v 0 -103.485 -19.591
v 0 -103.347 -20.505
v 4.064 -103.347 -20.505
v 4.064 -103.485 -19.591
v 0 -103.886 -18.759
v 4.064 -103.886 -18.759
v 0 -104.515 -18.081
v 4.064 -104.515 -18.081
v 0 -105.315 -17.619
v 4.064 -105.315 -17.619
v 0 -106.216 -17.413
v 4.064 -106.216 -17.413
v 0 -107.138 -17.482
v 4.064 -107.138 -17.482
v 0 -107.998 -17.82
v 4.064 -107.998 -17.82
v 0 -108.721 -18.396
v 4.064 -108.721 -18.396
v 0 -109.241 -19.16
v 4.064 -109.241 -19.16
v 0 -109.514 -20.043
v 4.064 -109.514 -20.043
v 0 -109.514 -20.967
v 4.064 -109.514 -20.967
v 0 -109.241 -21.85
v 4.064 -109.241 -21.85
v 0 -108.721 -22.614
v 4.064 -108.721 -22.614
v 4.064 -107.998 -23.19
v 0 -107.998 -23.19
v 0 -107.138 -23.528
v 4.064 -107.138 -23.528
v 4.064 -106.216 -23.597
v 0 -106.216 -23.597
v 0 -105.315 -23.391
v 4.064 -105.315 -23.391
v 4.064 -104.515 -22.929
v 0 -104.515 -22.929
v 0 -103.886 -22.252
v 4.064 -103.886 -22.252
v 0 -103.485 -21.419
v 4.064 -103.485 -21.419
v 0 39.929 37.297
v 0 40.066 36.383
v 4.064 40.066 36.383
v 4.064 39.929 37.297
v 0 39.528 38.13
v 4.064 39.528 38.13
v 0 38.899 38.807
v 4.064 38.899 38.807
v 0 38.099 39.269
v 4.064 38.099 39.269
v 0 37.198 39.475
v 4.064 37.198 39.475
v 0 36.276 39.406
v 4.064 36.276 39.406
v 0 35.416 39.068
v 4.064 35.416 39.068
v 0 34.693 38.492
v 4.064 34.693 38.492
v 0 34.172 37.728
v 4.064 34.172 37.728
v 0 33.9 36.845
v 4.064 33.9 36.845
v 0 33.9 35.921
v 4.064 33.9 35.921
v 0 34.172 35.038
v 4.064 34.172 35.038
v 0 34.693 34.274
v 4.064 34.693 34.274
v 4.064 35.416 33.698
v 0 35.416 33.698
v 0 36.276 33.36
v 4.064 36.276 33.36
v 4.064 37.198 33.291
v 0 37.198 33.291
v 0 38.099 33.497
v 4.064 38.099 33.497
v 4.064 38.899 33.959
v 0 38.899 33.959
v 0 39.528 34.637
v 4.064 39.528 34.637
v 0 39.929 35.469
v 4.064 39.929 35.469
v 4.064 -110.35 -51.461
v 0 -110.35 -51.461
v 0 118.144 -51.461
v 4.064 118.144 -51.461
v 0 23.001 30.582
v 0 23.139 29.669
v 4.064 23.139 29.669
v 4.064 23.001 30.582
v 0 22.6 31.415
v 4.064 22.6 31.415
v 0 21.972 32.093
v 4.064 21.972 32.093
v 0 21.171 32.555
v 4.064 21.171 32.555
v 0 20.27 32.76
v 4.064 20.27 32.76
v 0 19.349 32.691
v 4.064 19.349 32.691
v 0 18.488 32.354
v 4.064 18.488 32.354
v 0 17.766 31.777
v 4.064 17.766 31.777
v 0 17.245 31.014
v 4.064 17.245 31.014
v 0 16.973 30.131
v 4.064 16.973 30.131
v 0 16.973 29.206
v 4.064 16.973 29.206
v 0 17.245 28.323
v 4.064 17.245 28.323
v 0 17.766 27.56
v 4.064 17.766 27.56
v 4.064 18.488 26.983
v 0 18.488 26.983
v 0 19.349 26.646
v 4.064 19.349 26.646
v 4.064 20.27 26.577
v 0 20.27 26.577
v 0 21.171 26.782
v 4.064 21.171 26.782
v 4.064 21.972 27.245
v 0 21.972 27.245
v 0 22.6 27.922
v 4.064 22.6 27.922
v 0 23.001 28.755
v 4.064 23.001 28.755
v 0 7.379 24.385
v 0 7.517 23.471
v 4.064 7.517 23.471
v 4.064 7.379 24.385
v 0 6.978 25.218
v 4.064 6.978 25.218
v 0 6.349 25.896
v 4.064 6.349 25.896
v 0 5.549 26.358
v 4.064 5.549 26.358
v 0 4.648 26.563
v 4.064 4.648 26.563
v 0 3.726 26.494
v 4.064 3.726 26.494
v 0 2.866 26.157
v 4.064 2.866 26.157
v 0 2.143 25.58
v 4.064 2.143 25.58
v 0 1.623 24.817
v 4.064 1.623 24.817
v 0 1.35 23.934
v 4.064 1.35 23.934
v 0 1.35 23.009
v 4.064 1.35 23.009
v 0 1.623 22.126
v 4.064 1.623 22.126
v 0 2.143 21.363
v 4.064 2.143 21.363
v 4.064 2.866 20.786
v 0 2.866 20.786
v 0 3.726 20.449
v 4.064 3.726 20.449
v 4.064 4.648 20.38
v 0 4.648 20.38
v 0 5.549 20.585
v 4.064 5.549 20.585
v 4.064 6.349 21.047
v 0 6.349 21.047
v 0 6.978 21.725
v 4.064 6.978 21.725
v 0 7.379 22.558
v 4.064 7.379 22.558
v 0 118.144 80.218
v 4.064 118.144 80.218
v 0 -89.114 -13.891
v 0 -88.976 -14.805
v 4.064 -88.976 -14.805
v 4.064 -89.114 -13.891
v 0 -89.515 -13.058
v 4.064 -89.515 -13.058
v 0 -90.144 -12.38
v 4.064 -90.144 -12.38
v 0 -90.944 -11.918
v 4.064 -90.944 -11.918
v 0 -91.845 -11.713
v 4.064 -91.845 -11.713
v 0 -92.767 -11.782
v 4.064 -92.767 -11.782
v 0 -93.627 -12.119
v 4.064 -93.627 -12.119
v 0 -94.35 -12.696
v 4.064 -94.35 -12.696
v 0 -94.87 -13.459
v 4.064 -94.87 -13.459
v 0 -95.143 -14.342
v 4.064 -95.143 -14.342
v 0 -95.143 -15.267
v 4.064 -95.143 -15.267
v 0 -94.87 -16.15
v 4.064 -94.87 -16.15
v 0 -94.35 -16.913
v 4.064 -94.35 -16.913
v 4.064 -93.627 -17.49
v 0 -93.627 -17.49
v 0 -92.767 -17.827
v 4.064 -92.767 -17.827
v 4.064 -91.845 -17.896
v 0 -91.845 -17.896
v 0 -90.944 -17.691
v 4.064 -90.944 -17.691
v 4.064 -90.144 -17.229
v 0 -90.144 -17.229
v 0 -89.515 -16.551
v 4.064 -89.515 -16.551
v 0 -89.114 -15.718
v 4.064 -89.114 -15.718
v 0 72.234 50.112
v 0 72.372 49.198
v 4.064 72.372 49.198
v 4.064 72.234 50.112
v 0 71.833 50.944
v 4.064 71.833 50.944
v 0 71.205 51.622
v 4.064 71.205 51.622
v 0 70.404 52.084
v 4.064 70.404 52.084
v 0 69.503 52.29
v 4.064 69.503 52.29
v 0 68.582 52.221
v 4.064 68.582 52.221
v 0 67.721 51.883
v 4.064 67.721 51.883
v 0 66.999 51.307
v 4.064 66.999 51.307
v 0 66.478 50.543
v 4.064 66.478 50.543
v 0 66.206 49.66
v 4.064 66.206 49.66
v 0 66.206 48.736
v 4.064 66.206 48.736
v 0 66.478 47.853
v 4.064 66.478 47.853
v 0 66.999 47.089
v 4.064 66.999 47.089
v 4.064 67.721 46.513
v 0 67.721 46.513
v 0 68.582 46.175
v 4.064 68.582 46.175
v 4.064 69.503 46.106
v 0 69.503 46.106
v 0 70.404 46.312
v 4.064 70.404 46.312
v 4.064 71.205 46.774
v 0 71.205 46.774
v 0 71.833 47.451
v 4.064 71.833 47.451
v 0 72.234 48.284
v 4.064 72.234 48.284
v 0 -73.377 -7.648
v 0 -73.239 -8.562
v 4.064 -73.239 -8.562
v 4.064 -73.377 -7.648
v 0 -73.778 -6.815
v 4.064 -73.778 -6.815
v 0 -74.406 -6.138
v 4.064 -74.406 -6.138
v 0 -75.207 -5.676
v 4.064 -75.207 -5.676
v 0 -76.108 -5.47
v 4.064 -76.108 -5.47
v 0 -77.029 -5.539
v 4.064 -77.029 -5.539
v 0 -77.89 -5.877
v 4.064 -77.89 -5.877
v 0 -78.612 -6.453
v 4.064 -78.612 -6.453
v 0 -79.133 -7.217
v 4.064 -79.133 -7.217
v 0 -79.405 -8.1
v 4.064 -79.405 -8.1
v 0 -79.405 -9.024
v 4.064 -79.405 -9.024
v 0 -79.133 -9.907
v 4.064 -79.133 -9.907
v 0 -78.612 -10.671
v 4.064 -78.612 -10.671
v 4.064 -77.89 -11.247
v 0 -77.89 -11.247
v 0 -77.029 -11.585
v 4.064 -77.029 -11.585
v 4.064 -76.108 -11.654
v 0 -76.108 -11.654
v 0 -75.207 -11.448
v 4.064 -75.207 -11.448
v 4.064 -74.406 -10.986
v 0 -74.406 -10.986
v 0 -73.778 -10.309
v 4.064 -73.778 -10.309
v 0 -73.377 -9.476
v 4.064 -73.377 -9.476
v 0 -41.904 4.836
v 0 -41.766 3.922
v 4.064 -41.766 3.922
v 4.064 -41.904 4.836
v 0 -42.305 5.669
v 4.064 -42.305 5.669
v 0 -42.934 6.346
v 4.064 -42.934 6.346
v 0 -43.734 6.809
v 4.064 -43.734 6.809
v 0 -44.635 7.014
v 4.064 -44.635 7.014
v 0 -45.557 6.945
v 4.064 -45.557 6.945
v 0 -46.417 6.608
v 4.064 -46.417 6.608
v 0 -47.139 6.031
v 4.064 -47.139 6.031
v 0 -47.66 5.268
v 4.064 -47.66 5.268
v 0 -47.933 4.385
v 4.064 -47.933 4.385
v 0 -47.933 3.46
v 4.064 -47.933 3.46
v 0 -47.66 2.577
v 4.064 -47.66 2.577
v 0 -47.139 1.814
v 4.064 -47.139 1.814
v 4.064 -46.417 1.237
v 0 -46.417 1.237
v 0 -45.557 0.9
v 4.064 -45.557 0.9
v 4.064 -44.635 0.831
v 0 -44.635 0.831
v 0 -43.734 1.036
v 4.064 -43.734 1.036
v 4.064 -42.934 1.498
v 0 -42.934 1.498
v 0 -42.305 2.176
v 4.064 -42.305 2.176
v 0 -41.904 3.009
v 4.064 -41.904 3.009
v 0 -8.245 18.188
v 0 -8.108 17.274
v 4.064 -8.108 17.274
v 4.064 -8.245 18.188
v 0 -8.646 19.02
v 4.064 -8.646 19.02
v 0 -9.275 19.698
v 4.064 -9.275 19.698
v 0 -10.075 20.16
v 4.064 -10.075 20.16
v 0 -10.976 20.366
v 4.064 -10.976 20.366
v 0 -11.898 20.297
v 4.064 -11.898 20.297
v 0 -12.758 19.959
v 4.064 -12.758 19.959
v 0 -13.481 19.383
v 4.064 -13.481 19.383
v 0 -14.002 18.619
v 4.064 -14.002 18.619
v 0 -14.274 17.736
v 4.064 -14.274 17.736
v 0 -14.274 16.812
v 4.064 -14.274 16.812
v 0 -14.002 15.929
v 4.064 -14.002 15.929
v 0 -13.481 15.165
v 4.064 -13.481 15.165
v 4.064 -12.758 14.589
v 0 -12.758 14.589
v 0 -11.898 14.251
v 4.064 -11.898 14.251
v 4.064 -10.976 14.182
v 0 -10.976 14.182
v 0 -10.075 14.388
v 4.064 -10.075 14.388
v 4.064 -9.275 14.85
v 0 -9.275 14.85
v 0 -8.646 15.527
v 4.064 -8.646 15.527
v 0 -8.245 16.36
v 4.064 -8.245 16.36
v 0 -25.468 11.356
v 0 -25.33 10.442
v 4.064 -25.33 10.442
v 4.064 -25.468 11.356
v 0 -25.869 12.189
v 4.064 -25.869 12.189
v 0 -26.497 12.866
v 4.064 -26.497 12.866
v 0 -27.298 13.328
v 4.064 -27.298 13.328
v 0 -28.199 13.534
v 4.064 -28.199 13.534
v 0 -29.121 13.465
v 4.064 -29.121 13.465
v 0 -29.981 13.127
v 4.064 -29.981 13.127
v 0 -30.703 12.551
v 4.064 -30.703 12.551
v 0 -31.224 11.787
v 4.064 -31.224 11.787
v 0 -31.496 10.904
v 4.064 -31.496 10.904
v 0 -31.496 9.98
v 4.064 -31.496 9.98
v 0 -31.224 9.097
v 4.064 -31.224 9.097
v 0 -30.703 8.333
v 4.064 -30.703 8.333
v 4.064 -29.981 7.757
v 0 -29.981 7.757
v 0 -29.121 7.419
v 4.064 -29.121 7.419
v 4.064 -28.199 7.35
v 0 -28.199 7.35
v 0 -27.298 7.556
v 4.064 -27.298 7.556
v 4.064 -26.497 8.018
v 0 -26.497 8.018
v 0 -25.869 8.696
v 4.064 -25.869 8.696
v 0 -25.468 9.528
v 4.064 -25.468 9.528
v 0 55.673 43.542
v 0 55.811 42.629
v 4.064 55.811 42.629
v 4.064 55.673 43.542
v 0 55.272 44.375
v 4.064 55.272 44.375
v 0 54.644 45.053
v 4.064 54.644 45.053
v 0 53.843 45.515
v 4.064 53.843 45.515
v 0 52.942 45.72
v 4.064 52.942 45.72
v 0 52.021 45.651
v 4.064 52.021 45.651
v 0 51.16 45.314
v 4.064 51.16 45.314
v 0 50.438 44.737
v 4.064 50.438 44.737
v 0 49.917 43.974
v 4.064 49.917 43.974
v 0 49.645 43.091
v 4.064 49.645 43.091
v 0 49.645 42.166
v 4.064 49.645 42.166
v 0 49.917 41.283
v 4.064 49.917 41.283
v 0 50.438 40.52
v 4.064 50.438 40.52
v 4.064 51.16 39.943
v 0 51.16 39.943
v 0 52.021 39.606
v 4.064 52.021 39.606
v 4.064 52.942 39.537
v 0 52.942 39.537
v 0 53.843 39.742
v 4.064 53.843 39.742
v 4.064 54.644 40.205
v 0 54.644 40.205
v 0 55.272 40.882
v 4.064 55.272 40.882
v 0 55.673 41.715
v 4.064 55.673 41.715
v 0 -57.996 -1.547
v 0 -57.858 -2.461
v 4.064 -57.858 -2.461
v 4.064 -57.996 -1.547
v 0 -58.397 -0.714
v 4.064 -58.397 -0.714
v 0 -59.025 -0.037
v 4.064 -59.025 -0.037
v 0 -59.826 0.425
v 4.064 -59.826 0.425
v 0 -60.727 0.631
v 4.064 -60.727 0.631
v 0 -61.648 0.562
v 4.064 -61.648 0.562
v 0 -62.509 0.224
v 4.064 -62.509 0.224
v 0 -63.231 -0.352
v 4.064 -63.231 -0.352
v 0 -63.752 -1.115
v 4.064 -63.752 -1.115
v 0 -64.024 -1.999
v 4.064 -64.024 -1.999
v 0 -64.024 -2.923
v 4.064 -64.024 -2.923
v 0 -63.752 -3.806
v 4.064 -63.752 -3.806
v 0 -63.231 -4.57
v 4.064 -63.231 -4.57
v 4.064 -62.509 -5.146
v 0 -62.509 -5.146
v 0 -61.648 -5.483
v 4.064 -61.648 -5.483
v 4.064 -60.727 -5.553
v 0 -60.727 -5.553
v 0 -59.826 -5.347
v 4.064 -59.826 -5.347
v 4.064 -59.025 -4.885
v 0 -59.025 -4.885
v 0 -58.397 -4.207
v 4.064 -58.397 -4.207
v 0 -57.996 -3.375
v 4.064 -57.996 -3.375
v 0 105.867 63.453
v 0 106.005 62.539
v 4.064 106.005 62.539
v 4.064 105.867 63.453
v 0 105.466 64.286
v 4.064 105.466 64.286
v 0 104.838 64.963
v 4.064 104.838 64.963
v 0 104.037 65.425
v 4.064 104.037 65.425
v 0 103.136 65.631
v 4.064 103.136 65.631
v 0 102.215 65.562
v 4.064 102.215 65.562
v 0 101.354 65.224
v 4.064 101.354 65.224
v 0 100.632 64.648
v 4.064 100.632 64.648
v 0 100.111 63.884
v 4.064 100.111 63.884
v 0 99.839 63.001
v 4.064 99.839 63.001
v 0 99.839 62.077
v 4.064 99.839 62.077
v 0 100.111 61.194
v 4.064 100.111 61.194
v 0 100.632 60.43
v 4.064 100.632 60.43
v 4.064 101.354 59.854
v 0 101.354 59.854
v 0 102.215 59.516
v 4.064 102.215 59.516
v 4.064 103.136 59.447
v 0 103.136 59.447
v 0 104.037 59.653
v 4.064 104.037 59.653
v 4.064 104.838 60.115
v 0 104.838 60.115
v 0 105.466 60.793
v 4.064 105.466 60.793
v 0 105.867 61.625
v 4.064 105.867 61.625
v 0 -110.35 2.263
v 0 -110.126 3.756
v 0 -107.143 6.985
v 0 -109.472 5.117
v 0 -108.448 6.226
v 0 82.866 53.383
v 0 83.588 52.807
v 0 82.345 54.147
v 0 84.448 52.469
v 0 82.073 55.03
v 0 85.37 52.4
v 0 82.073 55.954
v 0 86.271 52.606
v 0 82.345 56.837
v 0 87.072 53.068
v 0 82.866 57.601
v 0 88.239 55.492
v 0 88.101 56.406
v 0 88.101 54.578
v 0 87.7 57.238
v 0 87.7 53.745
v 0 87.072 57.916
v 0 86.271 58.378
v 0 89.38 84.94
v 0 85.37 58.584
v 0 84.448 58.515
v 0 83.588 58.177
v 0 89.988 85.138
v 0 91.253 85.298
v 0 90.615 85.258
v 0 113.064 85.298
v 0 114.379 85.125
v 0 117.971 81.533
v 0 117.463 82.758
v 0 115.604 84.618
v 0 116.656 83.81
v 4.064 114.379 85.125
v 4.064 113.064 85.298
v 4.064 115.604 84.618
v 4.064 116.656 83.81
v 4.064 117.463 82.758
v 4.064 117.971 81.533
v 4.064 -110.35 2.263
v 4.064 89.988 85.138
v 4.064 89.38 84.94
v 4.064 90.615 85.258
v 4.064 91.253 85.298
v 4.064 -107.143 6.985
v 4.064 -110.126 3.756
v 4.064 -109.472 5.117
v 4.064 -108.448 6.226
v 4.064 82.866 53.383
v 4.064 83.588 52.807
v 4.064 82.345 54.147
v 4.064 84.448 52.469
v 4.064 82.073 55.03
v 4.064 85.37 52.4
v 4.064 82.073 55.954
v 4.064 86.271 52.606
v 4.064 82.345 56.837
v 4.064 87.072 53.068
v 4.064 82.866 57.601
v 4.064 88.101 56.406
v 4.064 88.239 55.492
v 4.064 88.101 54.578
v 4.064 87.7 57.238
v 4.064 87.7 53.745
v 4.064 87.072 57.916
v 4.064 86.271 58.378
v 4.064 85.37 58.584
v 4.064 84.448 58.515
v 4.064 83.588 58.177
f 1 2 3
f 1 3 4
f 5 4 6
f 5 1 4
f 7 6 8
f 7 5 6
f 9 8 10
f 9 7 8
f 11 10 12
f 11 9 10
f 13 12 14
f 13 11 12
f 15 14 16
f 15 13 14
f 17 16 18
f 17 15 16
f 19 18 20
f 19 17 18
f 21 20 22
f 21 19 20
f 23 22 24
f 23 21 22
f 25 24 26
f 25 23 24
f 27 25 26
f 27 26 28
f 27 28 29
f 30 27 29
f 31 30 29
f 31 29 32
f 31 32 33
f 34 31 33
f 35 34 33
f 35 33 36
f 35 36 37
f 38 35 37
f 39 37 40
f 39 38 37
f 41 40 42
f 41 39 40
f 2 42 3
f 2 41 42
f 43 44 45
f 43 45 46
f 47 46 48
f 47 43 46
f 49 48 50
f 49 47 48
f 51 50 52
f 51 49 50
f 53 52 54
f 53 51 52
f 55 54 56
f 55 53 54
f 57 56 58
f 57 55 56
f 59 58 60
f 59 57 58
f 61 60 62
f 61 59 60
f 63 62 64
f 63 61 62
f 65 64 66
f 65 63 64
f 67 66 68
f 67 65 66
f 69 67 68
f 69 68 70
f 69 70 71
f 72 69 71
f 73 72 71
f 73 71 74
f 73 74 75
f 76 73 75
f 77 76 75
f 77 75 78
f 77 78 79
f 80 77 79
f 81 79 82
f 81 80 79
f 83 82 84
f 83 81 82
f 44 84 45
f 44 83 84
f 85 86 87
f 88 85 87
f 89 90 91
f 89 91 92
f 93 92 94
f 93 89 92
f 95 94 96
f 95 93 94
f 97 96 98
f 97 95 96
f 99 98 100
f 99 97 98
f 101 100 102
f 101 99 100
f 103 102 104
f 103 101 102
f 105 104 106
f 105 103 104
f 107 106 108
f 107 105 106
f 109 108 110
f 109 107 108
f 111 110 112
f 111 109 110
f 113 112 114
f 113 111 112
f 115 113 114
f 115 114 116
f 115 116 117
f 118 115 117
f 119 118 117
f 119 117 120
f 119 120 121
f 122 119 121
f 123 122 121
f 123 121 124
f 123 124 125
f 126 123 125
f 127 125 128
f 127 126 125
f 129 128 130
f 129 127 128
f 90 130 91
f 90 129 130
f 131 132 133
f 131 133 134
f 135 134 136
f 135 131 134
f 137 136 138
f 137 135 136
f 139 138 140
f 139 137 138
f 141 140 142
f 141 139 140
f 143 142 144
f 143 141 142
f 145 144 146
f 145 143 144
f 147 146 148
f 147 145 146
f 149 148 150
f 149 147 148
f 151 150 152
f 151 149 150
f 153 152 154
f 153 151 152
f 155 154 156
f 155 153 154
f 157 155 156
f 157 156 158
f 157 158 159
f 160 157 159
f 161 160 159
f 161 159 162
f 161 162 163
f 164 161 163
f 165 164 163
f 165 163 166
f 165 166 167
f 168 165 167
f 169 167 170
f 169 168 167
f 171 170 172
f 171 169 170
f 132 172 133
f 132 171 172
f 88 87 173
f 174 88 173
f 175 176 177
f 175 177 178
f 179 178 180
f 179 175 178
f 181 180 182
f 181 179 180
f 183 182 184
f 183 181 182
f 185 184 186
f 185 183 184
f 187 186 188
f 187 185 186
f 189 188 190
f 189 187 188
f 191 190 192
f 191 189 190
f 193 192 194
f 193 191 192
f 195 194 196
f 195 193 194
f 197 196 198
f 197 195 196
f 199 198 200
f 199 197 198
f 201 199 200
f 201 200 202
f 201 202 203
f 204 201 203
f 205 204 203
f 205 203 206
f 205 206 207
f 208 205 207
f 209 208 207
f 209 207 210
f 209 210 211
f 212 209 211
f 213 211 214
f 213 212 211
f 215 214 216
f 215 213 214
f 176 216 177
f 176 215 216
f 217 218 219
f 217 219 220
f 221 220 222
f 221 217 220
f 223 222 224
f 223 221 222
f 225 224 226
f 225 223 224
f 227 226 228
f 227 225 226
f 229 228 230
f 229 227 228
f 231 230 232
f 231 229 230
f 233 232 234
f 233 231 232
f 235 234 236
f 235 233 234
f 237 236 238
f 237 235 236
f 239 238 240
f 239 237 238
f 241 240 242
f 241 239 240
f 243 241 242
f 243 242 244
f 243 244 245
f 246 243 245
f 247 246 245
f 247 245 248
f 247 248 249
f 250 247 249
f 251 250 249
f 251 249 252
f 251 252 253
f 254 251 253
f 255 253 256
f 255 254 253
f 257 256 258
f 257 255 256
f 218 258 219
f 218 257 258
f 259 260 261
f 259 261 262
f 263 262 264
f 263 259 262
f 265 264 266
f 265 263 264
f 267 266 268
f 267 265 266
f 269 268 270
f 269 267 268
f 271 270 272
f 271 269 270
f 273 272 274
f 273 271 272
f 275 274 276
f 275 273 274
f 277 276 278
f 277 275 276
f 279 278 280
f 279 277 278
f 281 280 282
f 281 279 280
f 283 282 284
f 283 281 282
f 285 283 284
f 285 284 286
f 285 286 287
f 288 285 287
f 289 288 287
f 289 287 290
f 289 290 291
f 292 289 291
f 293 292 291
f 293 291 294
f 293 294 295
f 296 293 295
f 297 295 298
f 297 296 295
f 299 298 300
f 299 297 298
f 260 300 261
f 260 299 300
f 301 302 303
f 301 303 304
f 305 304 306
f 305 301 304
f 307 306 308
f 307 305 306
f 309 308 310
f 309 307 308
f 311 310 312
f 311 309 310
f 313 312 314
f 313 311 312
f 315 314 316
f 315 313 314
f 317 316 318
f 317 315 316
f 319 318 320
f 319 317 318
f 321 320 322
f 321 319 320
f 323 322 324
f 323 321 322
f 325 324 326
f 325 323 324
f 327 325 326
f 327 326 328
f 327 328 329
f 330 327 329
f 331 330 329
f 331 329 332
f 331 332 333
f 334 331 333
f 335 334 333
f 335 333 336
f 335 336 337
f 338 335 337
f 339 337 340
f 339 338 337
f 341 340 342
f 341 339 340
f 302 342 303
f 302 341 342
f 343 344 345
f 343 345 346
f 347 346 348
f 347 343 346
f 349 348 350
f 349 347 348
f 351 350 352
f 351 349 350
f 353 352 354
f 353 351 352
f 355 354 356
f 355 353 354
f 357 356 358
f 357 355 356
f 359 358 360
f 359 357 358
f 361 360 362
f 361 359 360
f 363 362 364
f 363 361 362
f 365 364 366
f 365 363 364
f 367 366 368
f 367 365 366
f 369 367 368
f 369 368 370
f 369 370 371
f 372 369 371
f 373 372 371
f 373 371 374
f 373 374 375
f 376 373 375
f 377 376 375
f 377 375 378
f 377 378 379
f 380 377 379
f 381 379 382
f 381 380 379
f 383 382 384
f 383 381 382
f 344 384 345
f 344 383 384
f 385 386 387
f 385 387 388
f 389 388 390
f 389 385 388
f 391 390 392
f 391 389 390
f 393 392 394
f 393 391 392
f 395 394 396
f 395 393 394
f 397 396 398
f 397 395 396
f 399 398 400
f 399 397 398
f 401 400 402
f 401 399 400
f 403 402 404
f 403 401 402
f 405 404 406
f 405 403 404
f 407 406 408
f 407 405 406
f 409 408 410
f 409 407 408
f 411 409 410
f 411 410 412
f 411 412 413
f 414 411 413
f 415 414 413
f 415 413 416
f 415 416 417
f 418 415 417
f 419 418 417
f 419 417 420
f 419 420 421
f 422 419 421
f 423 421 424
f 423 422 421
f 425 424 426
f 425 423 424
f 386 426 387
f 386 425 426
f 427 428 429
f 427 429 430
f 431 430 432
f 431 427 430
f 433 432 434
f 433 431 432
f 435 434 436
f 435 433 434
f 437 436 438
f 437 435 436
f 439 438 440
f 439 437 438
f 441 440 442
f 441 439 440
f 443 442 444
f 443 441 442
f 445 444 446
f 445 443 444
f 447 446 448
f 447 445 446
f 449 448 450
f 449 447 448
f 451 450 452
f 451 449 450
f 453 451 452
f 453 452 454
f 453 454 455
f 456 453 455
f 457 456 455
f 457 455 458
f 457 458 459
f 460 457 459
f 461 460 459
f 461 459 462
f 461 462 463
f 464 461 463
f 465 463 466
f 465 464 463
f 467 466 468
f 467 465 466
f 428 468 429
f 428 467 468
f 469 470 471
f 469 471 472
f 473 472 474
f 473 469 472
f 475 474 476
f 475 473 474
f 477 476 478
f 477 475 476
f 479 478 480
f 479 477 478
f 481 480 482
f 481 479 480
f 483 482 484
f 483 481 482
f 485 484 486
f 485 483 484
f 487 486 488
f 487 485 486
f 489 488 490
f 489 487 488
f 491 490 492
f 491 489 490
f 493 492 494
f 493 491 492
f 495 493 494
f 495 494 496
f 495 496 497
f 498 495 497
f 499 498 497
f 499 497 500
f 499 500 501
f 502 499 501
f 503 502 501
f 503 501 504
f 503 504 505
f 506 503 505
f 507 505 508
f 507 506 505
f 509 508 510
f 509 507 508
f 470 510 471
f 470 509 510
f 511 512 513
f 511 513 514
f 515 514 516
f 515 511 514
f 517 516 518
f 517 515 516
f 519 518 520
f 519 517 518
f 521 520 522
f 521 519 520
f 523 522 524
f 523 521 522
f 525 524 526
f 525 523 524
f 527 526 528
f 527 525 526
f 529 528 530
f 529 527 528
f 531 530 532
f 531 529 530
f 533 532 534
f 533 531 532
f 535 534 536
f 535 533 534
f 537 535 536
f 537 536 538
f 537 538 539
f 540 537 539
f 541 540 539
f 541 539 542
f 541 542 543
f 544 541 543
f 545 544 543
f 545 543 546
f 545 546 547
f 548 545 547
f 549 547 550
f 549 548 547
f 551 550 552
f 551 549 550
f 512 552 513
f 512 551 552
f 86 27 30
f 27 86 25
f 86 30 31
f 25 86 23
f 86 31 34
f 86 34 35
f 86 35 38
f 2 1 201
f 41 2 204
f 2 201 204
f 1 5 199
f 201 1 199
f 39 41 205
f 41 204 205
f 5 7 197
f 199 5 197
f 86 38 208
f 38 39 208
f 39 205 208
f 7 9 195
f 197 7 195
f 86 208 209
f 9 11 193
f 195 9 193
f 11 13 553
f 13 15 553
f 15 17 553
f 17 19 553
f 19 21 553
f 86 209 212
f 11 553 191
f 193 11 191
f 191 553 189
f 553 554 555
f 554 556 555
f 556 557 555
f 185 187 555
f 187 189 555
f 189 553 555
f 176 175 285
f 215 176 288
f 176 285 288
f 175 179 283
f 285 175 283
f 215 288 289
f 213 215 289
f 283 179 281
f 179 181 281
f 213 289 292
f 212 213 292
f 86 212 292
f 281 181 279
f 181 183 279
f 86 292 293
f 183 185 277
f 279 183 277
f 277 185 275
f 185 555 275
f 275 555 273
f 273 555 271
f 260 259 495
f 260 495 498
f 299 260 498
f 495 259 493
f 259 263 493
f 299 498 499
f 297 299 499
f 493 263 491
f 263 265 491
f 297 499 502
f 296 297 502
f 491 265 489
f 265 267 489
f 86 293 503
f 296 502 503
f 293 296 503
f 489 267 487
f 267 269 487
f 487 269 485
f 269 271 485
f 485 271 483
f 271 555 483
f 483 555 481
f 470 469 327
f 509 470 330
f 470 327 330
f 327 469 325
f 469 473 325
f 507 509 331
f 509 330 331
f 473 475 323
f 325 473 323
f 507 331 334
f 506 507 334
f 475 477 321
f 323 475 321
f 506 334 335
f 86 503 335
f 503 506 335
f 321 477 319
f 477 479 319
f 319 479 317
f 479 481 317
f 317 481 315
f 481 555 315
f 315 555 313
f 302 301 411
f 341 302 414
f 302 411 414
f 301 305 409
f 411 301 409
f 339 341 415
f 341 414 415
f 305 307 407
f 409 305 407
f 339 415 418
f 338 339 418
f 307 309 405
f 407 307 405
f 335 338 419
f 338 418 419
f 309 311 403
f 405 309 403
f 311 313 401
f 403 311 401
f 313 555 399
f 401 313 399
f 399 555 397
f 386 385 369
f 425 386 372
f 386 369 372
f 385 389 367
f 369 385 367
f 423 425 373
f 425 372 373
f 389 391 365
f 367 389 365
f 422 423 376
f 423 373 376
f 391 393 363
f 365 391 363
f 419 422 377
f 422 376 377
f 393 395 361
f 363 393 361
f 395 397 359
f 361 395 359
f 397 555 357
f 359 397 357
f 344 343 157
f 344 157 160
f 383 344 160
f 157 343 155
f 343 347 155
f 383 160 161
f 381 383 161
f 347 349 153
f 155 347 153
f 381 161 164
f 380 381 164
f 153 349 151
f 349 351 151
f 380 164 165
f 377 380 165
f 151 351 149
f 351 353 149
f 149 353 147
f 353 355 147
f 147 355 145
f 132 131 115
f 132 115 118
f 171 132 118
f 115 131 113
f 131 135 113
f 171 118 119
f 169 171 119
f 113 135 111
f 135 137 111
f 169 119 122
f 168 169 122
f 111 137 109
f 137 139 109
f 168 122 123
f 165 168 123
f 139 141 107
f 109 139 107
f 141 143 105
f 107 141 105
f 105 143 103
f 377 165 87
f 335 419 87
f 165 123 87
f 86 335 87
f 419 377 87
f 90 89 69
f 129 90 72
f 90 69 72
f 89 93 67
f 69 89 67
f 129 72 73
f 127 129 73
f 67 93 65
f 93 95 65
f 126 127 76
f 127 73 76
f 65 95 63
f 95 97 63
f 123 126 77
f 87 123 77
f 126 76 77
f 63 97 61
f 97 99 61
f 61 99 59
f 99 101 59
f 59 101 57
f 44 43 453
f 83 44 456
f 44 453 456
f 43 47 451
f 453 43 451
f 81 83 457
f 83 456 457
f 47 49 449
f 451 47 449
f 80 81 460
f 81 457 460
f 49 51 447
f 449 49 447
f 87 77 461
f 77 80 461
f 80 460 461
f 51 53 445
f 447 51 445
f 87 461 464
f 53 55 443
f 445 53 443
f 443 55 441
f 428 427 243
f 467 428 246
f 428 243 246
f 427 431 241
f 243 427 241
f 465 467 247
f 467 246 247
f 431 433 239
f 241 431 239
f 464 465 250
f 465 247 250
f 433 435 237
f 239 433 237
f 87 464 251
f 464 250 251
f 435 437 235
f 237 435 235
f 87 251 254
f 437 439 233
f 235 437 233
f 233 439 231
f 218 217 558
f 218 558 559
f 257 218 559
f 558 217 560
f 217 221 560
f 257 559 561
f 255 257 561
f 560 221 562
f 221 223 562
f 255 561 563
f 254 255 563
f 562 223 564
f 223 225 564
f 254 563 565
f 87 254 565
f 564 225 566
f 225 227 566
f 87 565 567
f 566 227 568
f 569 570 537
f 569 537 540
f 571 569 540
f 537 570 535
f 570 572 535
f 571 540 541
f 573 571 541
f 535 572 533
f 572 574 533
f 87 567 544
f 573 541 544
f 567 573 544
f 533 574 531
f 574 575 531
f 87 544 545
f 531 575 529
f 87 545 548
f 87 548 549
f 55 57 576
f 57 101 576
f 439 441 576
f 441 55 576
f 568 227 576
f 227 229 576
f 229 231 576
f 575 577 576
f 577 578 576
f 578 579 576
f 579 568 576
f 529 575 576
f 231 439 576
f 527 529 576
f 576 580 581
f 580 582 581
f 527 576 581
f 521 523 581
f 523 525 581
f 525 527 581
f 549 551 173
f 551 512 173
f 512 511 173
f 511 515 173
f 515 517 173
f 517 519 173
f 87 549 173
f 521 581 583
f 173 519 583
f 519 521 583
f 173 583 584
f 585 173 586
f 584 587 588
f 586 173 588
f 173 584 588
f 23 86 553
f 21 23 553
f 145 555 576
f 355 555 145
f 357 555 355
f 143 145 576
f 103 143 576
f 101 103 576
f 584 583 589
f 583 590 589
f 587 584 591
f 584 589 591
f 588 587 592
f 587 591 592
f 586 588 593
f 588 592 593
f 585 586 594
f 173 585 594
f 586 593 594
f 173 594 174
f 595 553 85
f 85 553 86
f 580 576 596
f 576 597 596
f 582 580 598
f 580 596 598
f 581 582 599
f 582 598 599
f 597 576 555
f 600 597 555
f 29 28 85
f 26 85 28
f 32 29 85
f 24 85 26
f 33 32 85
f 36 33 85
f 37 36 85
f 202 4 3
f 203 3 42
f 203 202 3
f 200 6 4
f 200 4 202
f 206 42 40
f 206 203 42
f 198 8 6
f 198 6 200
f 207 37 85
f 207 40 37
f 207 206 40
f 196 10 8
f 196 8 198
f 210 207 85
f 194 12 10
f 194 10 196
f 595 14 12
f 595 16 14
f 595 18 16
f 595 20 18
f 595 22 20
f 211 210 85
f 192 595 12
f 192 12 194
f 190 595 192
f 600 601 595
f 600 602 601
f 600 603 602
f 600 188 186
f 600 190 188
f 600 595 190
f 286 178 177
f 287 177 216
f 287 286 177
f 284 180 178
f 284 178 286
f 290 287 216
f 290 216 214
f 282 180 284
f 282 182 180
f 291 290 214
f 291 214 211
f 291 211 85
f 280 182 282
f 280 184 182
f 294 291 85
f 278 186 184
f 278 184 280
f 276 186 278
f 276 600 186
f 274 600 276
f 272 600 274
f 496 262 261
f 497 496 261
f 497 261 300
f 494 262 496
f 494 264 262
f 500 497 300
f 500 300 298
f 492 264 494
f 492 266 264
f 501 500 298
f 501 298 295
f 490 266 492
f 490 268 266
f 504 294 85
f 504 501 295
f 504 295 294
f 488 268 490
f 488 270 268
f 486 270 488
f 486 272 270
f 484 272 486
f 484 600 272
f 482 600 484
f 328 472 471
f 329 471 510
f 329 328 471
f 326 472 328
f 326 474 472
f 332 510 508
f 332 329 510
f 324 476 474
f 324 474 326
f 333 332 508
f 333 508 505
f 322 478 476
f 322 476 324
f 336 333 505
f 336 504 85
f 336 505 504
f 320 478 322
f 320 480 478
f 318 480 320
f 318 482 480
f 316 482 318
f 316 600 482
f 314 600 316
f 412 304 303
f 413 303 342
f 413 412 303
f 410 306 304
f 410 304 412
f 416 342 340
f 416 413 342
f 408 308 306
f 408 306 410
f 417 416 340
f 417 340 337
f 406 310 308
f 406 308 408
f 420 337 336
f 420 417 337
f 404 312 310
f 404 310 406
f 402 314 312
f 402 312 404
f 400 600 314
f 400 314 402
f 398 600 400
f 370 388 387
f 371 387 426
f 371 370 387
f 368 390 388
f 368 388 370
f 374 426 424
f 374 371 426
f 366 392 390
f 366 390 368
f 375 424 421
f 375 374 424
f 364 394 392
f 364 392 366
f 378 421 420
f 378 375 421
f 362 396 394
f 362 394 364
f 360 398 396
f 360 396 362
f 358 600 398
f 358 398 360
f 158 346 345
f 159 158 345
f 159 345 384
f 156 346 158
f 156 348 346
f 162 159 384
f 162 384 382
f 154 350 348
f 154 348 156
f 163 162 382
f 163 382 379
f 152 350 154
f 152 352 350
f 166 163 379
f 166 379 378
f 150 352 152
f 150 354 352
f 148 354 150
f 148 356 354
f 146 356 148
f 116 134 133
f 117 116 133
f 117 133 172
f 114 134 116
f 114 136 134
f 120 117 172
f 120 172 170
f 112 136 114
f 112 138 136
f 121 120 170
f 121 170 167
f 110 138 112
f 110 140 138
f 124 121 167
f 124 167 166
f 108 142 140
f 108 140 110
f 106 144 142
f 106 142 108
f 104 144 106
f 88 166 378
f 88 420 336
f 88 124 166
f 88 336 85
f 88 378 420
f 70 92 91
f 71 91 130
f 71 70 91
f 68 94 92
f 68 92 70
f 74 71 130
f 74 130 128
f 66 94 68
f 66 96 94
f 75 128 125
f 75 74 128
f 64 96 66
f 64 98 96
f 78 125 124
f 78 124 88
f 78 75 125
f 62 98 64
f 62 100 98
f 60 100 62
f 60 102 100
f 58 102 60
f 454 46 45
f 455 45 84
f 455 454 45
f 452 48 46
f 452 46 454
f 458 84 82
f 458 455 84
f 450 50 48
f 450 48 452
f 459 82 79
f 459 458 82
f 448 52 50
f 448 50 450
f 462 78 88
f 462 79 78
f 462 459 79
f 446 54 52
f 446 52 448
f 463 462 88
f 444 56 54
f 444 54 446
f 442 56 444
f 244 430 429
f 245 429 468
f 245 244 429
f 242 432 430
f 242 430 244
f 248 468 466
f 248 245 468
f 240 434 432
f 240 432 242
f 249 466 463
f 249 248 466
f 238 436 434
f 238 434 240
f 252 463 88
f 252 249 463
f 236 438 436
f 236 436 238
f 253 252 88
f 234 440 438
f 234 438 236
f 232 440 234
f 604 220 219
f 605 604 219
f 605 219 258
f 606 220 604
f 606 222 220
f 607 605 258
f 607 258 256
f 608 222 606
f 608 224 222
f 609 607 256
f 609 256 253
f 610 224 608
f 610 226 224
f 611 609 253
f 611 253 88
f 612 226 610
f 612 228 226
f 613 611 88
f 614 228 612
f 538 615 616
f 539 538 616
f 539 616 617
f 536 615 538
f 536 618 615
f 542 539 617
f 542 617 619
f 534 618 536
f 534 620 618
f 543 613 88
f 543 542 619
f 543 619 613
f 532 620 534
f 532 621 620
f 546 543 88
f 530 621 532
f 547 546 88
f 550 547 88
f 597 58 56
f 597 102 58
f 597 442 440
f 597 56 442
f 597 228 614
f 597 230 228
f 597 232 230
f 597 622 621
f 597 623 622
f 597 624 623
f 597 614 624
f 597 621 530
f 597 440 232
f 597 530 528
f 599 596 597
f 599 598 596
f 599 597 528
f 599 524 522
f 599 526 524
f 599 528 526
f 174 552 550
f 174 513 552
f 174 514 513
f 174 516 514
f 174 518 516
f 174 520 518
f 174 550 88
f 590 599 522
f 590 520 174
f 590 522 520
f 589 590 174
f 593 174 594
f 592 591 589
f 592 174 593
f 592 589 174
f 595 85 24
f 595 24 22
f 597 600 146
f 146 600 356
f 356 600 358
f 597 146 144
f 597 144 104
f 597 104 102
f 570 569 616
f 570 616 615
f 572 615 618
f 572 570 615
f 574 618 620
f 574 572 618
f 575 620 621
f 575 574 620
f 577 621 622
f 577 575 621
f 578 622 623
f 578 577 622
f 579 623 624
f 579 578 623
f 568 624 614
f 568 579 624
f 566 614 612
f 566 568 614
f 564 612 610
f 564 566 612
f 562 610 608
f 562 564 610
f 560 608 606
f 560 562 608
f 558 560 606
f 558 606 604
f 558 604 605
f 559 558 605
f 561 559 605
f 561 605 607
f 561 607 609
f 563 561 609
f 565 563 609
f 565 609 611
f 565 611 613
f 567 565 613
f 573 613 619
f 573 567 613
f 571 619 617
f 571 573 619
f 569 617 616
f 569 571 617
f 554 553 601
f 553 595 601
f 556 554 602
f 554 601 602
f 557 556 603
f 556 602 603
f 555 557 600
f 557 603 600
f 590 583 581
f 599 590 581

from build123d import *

# Parameters (mm, degrees)
F0_R     = 3.100498
F1_DEPTH = 4.064
F2_R     = 5.08


with BuildPart() as f1:
    # F0 (on Right) → F1 (new body)
    with BuildSketch(Plane.YZ):
        Polygon((-110.349961, 5.712933), (-110.349961, -51.461264), (118.143998, -51.461264), (118.143998, 85.298181), (90.28247, 85.298181), align=None)
        with Locations((-106.447847, -20.505097)):
            Circle(F0_R, mode=Mode.SUBTRACT)
        with Locations((-92.076812, -14.804511)):
            Circle(F0_R, mode=Mode.SUBTRACT)
        with Locations((-76.339489, -8.561957)):
            Circle(F0_R, mode=Mode.SUBTRACT)
        with Locations((-60.95832, -2.46068)):
            Circle(F0_R, mode=Mode.SUBTRACT)
        with Locations((-44.866651, 3.922433)):
            Circle(F0_R, mode=Mode.SUBTRACT)
        with Locations((-28.430619, 10.442145)):
            Circle(F0_R, mode=Mode.SUBTRACT)
        with Locations((-11.20806, 17.27385)):
            Circle(F0_R, mode=Mode.SUBTRACT)
        with Locations((4.416042, 23.471493)):
            Circle(F0_R, mode=Mode.SUBTRACT)
        with Locations((20.038726, 29.668572)):
            Circle(F0_R, mode=Mode.SUBTRACT)
        with Locations((36.965934, 36.38312)):
            Circle(F0_R, mode=Mode.SUBTRACT)
        with Locations((52.71062, 42.628594)):
            Circle(F0_R, mode=Mode.SUBTRACT)
        with Locations((69.271646, 49.197888)):
            Circle(F0_R, mode=Mode.SUBTRACT)
        with Locations((85.138393, 55.491781)):
            Circle(F0_R, mode=Mode.SUBTRACT)
        with Locations((102.904496, 62.539094)):
            Circle(F0_R, mode=Mode.SUBTRACT)
    extrude(amount=F1_DEPTH)

    # F2
    f2_edges = [f1.edges().sort_by_distance(p)[0] for p in [
        (2.032, -110.349961, 5.712933),
        (2.032, 118.143998, 85.298181),
        (2.032, 90.28247, 85.298181),
    ]]
    fillet(f2_edges, radius=F2_R)


solid = f1.part
